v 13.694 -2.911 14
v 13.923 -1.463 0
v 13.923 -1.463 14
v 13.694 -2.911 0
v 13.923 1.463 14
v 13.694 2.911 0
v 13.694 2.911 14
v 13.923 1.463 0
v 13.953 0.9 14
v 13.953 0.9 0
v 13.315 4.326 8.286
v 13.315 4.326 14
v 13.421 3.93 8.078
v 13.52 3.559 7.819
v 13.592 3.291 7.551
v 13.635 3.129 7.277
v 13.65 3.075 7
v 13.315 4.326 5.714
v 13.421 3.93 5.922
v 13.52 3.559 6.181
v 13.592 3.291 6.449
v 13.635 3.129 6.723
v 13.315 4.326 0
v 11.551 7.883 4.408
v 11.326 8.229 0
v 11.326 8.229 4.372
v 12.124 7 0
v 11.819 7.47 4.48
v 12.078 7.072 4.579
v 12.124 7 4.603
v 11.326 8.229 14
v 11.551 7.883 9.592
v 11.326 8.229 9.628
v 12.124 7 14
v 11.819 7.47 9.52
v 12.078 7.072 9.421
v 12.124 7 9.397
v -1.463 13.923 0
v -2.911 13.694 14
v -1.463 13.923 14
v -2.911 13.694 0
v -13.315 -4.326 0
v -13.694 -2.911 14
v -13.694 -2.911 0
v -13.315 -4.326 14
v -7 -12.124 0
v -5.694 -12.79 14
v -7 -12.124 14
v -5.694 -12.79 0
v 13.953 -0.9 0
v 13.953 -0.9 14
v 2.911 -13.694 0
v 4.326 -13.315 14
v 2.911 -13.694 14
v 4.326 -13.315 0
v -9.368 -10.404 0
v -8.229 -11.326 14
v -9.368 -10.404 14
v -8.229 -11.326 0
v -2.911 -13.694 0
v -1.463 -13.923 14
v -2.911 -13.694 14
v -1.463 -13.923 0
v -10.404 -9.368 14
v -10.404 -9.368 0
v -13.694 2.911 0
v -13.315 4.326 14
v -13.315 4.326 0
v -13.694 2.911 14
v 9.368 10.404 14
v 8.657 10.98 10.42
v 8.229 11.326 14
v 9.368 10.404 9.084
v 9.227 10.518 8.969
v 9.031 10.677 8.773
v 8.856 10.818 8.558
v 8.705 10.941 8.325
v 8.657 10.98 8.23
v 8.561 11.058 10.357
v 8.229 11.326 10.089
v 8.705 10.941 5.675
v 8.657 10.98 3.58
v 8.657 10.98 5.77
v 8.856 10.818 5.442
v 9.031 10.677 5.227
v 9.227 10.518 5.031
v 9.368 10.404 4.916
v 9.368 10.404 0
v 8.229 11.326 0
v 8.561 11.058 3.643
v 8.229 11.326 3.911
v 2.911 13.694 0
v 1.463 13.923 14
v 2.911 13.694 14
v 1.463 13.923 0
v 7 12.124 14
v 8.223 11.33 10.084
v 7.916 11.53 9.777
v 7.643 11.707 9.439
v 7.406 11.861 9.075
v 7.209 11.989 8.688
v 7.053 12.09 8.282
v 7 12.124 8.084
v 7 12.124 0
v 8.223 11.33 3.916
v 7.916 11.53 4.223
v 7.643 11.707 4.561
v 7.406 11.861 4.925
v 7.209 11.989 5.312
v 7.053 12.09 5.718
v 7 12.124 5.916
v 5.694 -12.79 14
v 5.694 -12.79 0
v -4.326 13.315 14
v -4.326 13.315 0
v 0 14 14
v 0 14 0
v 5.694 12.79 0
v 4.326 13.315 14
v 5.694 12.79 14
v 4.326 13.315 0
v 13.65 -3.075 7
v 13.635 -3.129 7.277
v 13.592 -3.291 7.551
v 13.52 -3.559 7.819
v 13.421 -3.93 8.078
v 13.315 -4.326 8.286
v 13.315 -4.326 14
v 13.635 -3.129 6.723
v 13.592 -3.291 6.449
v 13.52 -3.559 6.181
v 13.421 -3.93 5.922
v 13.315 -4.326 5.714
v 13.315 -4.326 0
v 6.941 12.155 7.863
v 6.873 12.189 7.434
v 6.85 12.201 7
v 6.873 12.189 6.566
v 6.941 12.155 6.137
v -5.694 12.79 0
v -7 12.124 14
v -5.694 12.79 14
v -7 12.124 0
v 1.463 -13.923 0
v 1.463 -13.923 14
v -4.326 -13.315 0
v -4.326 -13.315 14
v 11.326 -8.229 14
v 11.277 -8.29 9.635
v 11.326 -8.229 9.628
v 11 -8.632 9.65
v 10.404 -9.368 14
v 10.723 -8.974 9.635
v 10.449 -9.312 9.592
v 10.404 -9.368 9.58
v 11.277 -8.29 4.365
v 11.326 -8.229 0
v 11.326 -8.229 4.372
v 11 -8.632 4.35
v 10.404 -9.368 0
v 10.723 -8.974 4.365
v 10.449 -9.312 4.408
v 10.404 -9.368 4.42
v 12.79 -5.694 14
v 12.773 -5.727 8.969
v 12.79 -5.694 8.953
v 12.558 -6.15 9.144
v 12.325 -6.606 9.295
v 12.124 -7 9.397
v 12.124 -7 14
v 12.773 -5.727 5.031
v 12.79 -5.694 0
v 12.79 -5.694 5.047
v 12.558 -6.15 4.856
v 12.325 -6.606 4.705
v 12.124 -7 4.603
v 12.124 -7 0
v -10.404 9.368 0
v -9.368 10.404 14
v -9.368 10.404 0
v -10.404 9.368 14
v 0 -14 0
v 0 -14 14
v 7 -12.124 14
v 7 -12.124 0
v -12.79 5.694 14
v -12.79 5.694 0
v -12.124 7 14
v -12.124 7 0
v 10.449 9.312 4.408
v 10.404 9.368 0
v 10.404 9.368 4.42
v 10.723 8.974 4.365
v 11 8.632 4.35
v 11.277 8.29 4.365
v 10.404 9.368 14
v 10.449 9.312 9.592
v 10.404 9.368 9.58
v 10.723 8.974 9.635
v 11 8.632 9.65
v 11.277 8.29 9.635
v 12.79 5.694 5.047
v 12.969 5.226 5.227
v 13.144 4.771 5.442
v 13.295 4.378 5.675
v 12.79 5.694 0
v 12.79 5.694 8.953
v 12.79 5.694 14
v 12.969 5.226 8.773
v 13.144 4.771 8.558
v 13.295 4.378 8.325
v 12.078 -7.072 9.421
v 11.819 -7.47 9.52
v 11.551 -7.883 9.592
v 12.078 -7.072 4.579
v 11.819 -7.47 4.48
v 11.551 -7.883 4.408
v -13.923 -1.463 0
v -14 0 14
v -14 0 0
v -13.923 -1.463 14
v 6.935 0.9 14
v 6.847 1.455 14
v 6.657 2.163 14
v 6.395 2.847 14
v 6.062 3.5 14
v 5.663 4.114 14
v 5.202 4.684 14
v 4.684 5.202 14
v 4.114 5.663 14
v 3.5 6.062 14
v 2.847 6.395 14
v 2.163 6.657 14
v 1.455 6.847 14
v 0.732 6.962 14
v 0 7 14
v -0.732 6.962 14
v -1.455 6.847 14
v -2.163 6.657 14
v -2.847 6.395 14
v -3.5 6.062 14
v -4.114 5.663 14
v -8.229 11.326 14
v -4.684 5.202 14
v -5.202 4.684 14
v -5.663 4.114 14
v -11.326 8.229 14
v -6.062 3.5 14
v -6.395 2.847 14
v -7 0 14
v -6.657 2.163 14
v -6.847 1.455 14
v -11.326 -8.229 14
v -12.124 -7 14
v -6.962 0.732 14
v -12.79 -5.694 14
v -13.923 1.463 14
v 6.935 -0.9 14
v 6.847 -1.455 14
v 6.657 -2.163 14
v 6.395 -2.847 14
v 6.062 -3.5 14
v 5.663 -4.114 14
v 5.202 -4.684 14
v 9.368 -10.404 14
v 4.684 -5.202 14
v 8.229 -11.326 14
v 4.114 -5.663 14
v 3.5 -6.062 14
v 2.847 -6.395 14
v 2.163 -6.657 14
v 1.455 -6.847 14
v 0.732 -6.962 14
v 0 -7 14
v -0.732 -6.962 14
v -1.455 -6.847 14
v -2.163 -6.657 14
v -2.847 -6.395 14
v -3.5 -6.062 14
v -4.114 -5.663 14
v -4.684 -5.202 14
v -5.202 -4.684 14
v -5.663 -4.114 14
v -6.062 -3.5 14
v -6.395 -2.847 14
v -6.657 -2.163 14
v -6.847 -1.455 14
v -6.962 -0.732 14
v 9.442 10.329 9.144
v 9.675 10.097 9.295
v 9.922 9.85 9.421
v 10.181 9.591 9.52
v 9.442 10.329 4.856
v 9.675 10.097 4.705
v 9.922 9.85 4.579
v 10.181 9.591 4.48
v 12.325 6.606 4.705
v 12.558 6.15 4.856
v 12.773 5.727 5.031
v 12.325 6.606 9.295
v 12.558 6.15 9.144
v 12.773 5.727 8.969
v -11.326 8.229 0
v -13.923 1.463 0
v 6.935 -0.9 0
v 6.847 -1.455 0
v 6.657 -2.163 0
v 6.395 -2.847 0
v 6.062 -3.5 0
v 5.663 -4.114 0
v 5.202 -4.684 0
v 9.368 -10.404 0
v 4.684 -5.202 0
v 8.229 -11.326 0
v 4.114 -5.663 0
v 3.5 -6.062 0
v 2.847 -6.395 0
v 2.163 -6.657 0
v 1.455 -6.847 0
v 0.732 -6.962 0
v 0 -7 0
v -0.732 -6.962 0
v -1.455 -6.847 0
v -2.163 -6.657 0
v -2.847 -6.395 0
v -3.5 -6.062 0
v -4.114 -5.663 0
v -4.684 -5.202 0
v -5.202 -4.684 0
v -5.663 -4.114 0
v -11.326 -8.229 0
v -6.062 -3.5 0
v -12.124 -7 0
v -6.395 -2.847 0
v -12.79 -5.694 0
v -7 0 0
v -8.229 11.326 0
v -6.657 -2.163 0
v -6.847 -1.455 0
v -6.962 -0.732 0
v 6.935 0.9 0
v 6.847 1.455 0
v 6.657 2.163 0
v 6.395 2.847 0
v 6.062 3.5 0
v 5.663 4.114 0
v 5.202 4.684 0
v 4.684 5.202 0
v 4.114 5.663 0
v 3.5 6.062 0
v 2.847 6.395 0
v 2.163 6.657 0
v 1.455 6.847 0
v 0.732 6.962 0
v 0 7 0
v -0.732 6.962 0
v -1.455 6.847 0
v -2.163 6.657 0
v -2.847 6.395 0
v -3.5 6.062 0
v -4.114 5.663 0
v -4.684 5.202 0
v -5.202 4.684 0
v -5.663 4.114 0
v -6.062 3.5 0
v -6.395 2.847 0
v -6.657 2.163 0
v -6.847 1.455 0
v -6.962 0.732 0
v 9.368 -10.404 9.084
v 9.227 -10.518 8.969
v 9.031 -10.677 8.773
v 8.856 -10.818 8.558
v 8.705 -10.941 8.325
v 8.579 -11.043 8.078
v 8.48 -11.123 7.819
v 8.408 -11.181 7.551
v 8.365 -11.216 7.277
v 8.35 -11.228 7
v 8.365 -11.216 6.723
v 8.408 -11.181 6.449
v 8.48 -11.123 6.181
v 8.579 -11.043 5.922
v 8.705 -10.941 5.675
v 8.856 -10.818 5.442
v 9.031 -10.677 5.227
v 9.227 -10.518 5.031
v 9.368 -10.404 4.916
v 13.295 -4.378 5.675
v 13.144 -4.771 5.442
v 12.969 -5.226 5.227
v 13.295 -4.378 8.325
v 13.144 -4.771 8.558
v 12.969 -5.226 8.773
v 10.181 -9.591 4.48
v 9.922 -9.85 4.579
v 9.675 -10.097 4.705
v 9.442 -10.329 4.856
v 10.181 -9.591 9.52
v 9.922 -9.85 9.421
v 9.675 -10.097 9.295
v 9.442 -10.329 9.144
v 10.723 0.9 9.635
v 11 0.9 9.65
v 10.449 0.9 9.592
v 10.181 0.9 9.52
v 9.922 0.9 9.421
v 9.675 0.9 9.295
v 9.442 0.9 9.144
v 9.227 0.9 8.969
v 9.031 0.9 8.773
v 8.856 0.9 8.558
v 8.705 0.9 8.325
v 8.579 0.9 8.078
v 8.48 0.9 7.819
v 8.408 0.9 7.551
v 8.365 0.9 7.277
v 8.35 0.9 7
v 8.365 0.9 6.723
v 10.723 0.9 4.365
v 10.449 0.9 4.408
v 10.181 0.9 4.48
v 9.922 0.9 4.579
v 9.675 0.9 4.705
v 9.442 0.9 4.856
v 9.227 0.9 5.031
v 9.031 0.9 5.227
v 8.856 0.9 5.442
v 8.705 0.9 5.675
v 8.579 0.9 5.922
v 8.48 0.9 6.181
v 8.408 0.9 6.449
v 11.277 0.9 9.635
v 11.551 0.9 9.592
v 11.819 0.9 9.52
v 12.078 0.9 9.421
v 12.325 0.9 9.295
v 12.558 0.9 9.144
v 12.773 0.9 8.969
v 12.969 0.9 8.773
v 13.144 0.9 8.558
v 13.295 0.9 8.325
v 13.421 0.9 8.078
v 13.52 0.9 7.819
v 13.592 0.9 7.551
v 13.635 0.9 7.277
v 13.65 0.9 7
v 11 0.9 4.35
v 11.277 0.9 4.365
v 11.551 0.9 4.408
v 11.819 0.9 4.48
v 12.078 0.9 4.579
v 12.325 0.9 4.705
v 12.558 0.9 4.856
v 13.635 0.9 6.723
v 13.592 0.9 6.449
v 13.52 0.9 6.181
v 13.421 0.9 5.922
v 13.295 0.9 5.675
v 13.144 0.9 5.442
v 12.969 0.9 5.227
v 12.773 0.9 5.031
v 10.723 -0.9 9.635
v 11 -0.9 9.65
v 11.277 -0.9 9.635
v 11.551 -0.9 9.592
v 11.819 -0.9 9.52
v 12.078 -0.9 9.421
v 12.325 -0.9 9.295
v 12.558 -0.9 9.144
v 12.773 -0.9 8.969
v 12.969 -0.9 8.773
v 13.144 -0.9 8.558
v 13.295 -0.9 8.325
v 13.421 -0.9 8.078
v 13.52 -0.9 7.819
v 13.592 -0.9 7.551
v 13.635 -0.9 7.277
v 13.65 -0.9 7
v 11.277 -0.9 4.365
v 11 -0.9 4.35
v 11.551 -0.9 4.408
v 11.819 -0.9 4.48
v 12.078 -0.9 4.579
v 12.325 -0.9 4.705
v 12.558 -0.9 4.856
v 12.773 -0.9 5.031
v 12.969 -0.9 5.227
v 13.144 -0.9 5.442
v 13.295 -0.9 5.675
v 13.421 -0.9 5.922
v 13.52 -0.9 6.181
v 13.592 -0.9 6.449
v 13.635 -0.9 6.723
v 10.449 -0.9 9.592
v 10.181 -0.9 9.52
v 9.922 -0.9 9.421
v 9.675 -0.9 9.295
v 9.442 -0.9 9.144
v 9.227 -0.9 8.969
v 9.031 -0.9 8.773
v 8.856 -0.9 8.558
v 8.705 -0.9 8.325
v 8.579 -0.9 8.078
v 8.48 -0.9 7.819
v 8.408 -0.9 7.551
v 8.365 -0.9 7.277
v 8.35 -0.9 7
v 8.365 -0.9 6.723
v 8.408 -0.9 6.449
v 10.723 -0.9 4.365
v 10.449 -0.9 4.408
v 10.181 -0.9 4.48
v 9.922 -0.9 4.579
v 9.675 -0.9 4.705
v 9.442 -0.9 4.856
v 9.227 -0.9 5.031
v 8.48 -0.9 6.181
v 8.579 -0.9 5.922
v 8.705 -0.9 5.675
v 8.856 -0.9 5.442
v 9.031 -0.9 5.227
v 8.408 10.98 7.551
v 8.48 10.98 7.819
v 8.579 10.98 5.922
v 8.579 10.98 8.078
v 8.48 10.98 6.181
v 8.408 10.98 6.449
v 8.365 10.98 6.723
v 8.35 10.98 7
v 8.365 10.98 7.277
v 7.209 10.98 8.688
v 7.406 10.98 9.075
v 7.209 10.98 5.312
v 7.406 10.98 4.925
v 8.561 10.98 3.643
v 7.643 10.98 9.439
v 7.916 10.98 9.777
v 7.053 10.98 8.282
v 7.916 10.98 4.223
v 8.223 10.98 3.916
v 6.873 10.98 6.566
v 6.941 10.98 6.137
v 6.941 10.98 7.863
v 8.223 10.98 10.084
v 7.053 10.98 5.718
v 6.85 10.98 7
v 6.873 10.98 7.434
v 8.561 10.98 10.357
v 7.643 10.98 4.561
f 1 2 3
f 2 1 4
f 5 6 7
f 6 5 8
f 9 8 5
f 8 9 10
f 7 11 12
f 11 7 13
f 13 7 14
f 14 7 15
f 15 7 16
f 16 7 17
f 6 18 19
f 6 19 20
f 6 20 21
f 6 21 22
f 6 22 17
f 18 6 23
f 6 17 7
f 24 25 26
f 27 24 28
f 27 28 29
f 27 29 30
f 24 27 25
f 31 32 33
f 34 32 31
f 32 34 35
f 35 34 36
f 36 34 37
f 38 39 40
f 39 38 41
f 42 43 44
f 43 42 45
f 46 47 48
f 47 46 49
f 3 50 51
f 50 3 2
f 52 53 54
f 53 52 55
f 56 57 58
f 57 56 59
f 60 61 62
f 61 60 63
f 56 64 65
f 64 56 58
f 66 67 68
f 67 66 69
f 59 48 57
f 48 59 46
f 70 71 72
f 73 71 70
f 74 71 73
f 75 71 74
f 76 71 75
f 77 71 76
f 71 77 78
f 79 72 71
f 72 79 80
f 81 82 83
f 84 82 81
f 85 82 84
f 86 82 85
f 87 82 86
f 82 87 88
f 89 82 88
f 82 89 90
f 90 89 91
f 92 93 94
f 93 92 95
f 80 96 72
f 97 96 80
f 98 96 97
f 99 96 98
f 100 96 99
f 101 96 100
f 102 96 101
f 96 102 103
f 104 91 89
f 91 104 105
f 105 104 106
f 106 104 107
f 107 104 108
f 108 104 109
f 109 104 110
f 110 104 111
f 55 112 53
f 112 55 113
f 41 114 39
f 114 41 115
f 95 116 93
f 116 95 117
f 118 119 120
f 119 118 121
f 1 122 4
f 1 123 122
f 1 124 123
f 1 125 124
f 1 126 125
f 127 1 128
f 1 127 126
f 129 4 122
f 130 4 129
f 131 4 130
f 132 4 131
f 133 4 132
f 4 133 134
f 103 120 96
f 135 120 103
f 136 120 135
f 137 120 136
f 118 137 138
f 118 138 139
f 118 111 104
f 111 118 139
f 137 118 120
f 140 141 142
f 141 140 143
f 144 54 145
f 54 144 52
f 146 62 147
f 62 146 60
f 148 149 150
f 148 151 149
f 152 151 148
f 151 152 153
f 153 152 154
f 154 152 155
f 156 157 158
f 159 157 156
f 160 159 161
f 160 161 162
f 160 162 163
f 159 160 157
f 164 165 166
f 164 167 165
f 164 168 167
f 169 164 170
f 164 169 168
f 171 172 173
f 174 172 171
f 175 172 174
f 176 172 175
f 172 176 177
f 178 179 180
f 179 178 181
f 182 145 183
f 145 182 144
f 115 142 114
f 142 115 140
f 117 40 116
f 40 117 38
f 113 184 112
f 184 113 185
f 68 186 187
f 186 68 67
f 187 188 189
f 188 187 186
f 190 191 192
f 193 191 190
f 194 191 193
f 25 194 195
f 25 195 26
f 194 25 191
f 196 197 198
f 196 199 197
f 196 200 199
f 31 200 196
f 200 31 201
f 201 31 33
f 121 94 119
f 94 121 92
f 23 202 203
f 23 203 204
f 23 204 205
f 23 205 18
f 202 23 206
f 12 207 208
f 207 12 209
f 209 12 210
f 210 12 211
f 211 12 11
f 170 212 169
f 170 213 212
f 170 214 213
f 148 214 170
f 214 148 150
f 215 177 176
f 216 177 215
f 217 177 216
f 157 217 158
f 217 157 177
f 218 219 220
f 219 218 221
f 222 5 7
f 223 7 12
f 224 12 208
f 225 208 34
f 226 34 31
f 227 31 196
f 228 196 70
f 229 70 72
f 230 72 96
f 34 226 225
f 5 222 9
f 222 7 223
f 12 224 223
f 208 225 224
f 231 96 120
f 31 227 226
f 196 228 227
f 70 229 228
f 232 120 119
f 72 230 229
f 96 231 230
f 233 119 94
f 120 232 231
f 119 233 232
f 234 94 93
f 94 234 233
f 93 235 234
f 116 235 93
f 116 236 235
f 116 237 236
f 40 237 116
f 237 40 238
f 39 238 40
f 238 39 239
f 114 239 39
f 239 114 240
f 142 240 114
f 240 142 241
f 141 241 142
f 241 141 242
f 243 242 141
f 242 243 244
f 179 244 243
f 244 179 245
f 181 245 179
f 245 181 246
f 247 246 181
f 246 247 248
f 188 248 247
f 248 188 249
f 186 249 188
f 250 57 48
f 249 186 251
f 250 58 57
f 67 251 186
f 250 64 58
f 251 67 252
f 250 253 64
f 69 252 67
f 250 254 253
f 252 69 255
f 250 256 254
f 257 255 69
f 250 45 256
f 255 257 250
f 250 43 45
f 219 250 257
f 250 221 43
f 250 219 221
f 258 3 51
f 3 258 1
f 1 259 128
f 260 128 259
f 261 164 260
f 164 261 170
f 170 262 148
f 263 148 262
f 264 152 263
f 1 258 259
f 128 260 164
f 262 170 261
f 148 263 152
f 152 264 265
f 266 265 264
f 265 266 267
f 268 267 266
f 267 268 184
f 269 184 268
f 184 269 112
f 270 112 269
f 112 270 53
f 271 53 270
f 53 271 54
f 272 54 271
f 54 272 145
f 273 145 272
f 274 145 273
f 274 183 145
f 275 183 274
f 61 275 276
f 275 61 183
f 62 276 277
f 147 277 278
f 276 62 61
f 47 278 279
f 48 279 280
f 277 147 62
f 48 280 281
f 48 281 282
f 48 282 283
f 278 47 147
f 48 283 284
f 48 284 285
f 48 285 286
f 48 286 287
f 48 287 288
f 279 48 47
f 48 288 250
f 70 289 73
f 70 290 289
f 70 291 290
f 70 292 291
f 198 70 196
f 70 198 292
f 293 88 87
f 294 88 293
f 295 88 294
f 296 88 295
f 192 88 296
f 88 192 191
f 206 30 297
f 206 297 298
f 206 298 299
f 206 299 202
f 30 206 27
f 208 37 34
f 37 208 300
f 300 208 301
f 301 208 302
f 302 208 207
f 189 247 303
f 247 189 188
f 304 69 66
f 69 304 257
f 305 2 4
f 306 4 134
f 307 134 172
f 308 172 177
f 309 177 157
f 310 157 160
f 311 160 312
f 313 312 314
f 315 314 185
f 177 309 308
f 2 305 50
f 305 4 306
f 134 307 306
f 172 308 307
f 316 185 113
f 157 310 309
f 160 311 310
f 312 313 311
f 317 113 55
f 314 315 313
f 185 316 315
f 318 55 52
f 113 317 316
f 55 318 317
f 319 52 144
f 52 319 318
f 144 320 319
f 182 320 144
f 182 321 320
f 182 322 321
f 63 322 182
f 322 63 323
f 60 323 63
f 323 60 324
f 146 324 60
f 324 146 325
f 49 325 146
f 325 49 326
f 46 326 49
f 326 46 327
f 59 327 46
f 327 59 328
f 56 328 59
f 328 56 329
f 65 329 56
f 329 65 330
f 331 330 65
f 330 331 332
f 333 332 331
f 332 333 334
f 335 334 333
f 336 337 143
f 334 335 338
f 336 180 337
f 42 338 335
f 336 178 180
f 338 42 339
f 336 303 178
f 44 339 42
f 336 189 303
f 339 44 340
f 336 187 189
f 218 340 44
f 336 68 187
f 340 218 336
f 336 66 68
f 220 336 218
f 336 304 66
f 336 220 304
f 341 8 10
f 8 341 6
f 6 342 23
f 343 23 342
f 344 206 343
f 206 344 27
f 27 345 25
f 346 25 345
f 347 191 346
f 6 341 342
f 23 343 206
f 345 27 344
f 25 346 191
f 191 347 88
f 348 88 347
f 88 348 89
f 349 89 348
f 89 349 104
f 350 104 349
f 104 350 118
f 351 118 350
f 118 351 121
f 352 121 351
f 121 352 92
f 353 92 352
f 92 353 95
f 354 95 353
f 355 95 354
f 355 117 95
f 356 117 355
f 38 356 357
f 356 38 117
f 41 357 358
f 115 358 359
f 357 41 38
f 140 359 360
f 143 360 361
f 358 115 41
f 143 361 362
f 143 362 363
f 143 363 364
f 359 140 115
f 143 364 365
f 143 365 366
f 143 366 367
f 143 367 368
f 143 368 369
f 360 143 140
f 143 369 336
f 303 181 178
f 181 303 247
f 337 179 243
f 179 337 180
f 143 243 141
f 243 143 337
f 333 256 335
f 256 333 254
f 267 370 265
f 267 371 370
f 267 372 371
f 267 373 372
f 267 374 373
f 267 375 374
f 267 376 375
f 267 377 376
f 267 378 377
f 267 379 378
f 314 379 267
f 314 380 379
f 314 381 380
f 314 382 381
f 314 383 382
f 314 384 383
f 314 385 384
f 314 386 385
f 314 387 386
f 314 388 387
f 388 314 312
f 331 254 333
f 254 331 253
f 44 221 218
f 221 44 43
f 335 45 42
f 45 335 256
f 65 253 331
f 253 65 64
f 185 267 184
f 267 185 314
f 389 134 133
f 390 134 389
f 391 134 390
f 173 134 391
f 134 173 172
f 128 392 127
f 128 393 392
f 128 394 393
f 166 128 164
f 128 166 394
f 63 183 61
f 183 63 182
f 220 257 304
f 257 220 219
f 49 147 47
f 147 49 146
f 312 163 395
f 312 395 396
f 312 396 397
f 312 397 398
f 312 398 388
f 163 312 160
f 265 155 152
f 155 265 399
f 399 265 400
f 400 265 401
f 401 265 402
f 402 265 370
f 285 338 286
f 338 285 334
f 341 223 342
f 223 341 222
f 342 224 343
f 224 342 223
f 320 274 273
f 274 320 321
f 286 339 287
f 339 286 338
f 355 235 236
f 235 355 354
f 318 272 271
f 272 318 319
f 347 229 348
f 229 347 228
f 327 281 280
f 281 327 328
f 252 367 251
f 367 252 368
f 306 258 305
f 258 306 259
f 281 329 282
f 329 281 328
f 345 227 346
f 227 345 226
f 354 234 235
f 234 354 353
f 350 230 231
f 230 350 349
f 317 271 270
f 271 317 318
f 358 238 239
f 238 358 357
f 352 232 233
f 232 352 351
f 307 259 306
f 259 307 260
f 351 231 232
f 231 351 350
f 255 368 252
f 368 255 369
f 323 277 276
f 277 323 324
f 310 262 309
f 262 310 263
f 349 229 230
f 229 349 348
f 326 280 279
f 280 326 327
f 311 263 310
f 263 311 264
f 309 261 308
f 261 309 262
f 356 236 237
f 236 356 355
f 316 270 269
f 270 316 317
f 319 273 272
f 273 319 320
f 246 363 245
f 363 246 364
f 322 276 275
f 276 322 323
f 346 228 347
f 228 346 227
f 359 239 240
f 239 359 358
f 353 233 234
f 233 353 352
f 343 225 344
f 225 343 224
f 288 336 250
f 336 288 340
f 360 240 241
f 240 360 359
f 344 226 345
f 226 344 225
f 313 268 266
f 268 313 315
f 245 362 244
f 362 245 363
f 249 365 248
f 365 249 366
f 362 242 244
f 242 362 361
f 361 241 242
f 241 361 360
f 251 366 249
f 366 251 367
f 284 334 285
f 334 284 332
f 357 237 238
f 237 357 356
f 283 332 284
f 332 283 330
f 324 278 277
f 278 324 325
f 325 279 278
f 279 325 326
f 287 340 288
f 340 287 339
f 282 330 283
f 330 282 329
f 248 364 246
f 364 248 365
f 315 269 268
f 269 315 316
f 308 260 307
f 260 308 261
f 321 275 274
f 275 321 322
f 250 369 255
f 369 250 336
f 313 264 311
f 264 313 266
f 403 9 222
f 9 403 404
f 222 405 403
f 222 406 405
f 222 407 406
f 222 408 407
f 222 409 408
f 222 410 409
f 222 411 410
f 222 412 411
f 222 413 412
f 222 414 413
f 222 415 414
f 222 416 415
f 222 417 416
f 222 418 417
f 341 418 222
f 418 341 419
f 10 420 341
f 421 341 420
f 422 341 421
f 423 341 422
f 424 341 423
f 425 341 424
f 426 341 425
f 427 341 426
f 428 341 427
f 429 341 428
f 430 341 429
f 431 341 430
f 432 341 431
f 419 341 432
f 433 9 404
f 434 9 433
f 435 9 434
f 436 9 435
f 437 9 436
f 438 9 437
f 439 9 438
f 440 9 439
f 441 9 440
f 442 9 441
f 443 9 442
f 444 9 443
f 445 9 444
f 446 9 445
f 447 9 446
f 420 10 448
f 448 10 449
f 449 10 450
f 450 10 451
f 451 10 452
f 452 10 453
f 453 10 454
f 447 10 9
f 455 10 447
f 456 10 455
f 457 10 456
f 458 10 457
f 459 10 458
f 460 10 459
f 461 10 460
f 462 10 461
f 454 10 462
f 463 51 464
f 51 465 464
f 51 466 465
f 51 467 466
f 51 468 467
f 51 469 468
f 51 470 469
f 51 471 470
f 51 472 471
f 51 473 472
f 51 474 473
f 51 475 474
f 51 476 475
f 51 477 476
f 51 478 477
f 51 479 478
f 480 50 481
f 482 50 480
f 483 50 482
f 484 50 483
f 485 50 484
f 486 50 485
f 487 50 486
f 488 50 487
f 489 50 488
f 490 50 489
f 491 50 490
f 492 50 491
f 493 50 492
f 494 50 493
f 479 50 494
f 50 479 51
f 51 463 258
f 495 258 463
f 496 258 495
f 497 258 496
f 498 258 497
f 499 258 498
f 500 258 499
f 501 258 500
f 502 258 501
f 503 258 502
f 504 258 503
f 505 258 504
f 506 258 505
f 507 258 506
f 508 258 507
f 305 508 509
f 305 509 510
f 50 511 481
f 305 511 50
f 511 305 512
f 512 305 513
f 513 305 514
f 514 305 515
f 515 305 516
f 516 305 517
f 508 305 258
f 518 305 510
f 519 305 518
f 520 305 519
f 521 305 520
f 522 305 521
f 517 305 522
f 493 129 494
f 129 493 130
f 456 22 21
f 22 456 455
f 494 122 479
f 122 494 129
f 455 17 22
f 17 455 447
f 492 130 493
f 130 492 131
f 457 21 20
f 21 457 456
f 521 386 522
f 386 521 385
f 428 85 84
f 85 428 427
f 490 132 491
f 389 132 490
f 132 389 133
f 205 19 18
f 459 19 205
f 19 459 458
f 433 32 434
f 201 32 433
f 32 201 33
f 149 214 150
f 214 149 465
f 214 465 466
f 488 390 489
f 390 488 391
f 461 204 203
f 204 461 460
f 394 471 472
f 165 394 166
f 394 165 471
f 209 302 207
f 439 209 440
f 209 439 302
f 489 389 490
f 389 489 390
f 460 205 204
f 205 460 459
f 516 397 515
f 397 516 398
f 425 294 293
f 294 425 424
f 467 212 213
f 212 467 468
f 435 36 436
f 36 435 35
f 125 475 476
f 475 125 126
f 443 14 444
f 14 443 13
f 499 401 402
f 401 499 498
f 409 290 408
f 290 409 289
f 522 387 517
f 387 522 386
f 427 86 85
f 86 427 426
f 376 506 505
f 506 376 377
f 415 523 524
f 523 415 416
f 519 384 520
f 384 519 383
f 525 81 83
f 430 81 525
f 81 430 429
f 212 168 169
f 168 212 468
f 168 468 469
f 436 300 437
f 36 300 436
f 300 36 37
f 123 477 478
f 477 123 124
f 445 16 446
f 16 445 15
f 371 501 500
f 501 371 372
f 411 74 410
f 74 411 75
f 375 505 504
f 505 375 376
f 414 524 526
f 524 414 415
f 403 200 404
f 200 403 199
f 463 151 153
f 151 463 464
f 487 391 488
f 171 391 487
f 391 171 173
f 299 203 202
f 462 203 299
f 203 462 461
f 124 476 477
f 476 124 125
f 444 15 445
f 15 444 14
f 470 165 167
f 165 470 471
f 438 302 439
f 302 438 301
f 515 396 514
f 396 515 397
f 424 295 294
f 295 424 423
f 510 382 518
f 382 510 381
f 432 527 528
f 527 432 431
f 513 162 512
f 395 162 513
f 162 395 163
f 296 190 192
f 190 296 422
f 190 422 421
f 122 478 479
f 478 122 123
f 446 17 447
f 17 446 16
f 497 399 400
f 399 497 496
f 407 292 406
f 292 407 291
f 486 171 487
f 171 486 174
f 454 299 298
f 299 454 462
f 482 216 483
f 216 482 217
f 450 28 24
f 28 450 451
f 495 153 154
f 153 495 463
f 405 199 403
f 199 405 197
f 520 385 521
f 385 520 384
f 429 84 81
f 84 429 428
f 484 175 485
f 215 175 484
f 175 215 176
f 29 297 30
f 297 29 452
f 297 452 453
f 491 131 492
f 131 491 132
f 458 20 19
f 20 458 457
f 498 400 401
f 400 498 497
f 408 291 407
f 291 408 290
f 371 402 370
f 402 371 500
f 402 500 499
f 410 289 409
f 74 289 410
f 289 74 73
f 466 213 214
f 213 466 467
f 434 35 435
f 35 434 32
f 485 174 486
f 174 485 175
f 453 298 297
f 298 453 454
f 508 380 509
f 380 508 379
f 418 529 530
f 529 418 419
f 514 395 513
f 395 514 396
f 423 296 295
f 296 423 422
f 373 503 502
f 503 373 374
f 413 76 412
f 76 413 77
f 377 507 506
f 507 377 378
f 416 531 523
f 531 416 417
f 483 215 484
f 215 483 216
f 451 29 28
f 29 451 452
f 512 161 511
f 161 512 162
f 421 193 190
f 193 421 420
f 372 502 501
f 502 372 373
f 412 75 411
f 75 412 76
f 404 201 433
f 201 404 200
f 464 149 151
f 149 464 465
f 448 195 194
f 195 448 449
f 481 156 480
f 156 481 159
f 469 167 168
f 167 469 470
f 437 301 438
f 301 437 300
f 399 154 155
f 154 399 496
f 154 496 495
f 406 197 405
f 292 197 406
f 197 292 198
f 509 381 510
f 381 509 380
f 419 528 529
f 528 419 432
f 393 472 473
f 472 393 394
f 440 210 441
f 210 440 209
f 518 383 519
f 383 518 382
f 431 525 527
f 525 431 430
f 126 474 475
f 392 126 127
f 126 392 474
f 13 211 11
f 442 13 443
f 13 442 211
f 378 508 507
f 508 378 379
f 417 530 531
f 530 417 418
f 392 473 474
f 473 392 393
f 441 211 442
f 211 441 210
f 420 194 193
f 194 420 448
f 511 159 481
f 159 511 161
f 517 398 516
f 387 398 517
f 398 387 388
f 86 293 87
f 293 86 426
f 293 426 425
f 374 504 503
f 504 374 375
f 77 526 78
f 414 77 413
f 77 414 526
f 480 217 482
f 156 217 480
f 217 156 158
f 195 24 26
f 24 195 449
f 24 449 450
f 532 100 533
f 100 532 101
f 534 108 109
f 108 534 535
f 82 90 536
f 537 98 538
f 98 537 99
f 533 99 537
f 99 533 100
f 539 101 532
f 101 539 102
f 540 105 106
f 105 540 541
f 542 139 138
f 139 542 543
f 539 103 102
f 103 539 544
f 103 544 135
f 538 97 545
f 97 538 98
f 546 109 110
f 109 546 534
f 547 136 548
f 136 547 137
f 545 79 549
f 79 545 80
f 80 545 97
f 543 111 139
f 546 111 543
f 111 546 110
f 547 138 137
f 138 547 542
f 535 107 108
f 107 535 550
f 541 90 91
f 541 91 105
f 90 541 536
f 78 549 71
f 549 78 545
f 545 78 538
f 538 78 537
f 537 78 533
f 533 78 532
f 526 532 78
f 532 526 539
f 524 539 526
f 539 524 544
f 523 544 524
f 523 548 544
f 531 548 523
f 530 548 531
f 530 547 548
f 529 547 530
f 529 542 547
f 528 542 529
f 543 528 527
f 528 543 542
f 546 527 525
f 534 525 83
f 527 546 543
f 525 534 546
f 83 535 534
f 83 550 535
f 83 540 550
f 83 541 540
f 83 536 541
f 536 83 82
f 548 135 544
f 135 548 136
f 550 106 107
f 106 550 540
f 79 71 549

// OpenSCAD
// C-style split collar for 14 mm shaft.
$fn = 60;
eps = 0.02;
shaft_d = 14;
outer_d = 28;
width = 14;
slit_w = 1.8;
screw_d = 5.3;
difference() {
    cylinder(d = outer_d, h = width);
    translate([0, 0, -eps]) cylinder(d = shaft_d, h = width + 2 * eps);
    translate([0, -slit_w / 2, -eps]) cube([outer_d / 2 + eps, slit_w, width + 2 * eps]);
    translate([outer_d / 2 - 3, -outer_d / 2 - eps, width / 2]) rotate([-90, 0, 0]) cylinder(d = screw_d, h = outer_d + 2 * eps);
    translate([outer_d / 2 - 3, outer_d / 2 - 3 - eps, width / 2]) rotate([-90, 0, 0]) cylinder(d = screw_d + 3, h = 3 + 2 * eps);
}
